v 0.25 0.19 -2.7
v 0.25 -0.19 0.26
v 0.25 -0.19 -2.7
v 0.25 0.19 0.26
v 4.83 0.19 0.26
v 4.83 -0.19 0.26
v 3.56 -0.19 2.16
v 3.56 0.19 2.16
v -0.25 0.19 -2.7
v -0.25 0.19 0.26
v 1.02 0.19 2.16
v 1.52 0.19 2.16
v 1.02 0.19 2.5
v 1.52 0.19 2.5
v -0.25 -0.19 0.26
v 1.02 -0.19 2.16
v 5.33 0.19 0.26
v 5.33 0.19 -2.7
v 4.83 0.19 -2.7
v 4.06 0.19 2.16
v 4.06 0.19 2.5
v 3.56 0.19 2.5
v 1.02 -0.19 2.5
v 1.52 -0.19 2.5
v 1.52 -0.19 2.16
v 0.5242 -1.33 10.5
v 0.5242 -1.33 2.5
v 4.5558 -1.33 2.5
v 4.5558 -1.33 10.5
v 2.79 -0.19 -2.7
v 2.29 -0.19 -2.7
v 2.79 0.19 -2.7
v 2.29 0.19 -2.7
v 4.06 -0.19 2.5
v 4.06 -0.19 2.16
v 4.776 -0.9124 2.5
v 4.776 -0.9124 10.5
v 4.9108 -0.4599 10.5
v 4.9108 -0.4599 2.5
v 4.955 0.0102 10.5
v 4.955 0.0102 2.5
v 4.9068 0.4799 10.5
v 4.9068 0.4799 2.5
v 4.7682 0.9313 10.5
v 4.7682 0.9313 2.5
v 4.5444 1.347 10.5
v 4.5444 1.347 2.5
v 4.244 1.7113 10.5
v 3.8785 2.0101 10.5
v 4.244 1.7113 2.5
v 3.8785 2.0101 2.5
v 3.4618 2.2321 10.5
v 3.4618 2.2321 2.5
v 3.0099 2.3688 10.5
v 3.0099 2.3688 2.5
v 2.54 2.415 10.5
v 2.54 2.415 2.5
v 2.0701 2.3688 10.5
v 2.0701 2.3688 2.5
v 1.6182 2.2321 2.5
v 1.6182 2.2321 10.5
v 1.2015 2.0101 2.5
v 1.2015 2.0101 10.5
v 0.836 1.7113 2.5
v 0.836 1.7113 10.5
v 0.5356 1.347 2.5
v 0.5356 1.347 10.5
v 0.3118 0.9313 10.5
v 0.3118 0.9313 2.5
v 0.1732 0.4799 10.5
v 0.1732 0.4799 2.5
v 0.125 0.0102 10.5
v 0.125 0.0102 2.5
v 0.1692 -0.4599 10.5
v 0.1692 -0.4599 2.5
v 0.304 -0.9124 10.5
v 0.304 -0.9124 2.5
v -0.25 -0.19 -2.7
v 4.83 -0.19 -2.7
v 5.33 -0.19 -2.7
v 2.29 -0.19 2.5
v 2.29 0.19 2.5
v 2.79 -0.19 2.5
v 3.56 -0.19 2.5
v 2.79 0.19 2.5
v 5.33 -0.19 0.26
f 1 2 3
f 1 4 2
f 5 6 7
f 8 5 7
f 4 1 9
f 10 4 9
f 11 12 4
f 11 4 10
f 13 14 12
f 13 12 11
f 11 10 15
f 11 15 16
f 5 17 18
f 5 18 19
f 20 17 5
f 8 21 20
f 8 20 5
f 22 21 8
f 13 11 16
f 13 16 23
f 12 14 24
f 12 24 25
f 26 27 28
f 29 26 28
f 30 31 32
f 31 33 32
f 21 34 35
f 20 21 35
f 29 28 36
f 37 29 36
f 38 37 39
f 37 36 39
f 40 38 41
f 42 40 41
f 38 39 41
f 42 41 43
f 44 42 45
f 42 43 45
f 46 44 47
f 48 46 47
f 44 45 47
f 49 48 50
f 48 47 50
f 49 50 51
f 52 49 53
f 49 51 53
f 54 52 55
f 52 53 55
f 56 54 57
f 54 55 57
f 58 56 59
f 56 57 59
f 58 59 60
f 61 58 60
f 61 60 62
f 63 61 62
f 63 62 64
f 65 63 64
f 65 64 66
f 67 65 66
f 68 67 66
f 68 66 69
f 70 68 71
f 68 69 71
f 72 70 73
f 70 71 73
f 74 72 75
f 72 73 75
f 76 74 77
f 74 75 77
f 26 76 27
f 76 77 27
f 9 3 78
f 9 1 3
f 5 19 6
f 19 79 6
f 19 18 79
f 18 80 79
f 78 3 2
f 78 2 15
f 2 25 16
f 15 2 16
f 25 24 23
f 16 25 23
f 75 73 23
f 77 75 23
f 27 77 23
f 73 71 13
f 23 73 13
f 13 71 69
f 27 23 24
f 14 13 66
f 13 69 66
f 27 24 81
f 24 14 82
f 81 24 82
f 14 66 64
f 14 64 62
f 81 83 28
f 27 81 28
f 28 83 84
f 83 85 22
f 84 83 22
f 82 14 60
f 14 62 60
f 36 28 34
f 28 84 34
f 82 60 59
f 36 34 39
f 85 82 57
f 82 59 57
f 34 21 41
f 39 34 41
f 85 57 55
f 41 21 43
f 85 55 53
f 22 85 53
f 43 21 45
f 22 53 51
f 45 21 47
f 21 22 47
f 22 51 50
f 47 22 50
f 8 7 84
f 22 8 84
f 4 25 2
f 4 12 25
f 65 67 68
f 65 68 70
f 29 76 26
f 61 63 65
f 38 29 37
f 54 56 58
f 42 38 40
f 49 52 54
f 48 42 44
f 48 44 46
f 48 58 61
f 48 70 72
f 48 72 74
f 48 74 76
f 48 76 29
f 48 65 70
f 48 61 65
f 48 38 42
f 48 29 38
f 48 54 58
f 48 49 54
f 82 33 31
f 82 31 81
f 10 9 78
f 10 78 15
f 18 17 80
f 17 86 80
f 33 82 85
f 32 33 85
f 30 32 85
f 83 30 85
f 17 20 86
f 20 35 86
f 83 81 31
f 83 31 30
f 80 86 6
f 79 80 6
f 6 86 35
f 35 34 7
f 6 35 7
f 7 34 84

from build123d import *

# Parameters (mm, degrees)
SKETCH001_W  = 0.5
SKETCH001_H  = 5.5
PAD001_DEPTH = 0.19
PAD_DEPTH    = 8


with BuildPart() as pad001:
    # Sketch001 → Pad001 (new body, symmetric)
    with BuildSketch(Plane.XZ):
        with Locations((2.54, 0.05)):
            Rectangle(SKETCH001_W, SKETCH001_H)
        Polygon((0.25, -2.7), (-0.25, -2.7), (-0.25, 0.26), (1.02, 2.16), (1.02, 2.8), (1.52, 2.8), (1.52, 2.16), (0.25, 0.26), align=None)
        Polygon((3.56, 2.8), (4.06, 2.8), (4.06, 2.16), (5.33, 0.26), (5.33, -2.7), (4.83, -2.7), (4.83, 0.26), (3.56, 2.16), align=None)
    extrude(amount=PAD001_DEPTH, both=True)


with BuildPart() as to_92l_inline_wide:
    # Sketch → Pad (new body)
    with BuildSketch(Plane.XY.offset(2.5)):
        with BuildLine():
            Line((0.524231, -1.33), (4.555769, -1.33))
            ThreePointArc((4.555769, -1.33), (2.54, 2.415), (0.524231, -1.33))
        make_face()
    extrude(amount=PAD_DEPTH)

    # Pad_mp_cp: union Pad001
    add(pad001.part)


solid = to_92l_inline_wide.part
